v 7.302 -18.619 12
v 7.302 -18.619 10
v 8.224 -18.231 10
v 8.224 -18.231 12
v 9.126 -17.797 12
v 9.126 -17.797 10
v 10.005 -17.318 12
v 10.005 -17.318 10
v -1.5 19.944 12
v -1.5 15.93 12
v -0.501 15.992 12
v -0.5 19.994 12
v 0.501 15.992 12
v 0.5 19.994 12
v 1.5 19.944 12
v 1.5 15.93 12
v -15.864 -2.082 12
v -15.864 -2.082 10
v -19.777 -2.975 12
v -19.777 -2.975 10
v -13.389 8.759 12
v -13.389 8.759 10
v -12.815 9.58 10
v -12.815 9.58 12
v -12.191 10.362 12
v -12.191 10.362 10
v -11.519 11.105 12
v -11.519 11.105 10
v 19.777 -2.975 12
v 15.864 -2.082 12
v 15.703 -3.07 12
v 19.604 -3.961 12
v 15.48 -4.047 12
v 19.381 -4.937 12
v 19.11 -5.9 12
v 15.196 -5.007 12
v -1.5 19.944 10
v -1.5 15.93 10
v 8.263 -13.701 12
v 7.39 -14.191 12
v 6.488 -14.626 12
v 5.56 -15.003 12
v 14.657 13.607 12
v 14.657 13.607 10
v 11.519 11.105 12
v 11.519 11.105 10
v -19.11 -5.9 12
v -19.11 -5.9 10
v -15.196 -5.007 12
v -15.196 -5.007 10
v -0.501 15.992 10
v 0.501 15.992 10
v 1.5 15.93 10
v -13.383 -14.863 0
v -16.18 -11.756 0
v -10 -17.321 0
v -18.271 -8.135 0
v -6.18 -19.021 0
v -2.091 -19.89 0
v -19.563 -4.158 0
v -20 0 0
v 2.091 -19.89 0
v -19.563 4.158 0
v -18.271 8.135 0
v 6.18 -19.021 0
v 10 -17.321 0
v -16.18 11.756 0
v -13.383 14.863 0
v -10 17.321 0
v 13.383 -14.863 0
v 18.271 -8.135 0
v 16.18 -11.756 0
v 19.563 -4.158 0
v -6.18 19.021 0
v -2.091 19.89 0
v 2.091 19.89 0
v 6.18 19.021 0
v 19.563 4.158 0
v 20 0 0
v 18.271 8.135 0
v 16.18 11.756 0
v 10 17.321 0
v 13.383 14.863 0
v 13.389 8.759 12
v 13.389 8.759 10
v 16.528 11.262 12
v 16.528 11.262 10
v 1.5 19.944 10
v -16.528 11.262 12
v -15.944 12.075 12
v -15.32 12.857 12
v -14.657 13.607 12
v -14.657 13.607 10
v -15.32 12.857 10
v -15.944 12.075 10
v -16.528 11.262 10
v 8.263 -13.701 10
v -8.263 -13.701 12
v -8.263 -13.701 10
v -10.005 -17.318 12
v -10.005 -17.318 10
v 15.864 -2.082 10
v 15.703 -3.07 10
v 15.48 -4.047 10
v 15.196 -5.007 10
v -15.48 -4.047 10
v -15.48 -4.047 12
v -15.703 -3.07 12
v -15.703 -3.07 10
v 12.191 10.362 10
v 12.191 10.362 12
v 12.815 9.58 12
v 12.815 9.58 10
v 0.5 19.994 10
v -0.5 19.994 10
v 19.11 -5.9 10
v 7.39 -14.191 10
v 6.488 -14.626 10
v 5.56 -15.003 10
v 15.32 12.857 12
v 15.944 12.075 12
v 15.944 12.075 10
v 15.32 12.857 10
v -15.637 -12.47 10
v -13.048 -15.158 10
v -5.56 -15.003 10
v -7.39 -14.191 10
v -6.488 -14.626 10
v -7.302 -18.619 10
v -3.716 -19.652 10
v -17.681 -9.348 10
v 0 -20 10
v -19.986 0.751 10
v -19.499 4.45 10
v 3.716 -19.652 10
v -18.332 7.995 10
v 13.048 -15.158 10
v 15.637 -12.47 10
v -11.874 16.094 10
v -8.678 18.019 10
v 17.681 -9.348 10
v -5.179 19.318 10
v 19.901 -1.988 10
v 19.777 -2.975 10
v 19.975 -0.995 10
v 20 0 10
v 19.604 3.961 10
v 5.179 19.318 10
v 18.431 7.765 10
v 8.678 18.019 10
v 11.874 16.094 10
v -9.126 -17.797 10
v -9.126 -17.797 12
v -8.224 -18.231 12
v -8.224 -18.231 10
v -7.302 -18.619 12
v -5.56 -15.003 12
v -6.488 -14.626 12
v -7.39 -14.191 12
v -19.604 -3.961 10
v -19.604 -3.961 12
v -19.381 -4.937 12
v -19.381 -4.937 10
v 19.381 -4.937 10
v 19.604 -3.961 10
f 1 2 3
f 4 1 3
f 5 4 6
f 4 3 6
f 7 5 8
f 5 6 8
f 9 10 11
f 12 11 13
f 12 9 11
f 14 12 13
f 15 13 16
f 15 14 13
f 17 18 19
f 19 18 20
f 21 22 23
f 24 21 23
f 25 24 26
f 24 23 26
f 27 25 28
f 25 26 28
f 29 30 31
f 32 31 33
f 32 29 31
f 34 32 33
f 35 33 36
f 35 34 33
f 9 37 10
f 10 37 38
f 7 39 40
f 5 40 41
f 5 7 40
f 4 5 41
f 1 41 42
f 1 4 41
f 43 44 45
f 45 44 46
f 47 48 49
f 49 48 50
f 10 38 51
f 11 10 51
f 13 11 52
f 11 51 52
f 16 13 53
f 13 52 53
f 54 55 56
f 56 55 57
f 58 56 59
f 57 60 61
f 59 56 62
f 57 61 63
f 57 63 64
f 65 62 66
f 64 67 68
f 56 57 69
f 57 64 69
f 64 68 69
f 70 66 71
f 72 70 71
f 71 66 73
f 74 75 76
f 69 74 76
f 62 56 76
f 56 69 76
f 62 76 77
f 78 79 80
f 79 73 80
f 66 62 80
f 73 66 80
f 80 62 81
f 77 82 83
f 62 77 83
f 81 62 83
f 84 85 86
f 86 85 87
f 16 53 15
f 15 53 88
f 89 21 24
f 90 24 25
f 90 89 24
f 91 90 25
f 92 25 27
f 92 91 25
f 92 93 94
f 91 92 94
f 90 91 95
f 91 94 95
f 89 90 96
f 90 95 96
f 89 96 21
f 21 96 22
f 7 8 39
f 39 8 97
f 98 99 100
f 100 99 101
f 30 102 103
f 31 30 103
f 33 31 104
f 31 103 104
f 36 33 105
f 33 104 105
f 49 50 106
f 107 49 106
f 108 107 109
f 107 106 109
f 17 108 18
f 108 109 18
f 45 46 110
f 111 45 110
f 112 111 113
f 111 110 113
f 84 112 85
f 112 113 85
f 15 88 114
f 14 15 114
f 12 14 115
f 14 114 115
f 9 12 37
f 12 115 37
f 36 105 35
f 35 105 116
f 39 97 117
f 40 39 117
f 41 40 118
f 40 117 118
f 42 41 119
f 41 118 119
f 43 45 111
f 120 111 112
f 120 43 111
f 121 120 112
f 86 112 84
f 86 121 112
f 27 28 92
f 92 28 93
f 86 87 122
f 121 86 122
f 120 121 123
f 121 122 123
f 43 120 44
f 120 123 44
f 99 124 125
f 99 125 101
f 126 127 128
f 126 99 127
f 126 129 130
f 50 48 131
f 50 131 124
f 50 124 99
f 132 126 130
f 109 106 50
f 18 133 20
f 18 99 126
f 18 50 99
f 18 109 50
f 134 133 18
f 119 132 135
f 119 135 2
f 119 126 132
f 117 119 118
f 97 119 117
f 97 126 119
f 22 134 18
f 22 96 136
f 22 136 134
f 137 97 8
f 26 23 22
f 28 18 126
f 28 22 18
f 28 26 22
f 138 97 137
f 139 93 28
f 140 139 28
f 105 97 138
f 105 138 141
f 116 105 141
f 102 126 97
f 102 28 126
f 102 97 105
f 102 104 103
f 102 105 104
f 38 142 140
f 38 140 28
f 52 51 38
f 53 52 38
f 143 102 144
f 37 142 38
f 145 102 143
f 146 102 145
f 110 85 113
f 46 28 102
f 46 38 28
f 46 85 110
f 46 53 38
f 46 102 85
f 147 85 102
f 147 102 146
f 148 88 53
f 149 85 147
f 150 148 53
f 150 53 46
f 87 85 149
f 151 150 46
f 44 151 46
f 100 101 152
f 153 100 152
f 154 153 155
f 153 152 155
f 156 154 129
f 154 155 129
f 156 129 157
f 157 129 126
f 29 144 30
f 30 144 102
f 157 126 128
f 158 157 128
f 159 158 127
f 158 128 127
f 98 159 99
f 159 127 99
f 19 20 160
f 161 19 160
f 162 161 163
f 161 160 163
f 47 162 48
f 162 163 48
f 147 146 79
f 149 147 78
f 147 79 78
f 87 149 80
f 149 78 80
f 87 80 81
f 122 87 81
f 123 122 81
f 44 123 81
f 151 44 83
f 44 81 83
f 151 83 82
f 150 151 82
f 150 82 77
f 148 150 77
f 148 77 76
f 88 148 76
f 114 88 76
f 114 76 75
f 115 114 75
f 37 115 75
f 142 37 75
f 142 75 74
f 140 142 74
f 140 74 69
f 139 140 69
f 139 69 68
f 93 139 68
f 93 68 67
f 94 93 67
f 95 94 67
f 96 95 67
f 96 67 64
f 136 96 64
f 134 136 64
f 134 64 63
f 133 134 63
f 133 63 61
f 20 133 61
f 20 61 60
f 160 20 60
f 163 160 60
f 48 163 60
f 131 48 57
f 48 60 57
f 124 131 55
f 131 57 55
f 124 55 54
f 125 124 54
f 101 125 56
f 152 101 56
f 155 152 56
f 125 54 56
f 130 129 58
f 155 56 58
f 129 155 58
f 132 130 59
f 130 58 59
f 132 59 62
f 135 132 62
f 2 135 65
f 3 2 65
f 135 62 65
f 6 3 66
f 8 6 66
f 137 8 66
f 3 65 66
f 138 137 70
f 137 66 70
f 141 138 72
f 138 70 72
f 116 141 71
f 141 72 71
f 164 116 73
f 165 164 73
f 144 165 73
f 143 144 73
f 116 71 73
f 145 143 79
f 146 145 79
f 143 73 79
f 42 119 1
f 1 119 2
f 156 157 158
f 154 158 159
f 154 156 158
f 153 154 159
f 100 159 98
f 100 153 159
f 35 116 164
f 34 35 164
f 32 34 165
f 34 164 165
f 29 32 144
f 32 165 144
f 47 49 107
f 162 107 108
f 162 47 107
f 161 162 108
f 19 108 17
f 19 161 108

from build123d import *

# Parameters (mm, degrees)
F0_R     = 20
F1_DEPTH = 10
F3_DEPTH = 2
F4_COUNT = 7


with BuildPart() as f1:
    # F0 (on Top) → F1 (new body)
    with BuildSketch(Plane.XY):
        Circle(F0_R)
    extrude(amount=F1_DEPTH)

    # F2 (on face) → F3 (join)
    with BuildSketch(Plane.XY.offset(10)):
        with BuildLine():
            Line((1.5, 15.929532), (1.5, 19.943671))
            ThreePointArc((1.5, 19.943671), (0, 20), (-1.5, 19.943671))
            Line((-1.5, 19.943671), (-1.5, 15.929532))
            ThreePointArc((-1.5, 15.929532), (0, 16), (1.5, 15.929532))
        make_face()
    extrude(amount=F3_DEPTH)

    # F4: F1 ×7 about axis
    f4_axis = Axis((0, 0, 0), (0, 0, -1))


with BuildPart() as f1_1:
    add(f1.part)
    for i in range(1, F4_COUNT):
        add(f1.part.rotate(f4_axis, i * 360 / F4_COUNT))


solid = f1_1.part
